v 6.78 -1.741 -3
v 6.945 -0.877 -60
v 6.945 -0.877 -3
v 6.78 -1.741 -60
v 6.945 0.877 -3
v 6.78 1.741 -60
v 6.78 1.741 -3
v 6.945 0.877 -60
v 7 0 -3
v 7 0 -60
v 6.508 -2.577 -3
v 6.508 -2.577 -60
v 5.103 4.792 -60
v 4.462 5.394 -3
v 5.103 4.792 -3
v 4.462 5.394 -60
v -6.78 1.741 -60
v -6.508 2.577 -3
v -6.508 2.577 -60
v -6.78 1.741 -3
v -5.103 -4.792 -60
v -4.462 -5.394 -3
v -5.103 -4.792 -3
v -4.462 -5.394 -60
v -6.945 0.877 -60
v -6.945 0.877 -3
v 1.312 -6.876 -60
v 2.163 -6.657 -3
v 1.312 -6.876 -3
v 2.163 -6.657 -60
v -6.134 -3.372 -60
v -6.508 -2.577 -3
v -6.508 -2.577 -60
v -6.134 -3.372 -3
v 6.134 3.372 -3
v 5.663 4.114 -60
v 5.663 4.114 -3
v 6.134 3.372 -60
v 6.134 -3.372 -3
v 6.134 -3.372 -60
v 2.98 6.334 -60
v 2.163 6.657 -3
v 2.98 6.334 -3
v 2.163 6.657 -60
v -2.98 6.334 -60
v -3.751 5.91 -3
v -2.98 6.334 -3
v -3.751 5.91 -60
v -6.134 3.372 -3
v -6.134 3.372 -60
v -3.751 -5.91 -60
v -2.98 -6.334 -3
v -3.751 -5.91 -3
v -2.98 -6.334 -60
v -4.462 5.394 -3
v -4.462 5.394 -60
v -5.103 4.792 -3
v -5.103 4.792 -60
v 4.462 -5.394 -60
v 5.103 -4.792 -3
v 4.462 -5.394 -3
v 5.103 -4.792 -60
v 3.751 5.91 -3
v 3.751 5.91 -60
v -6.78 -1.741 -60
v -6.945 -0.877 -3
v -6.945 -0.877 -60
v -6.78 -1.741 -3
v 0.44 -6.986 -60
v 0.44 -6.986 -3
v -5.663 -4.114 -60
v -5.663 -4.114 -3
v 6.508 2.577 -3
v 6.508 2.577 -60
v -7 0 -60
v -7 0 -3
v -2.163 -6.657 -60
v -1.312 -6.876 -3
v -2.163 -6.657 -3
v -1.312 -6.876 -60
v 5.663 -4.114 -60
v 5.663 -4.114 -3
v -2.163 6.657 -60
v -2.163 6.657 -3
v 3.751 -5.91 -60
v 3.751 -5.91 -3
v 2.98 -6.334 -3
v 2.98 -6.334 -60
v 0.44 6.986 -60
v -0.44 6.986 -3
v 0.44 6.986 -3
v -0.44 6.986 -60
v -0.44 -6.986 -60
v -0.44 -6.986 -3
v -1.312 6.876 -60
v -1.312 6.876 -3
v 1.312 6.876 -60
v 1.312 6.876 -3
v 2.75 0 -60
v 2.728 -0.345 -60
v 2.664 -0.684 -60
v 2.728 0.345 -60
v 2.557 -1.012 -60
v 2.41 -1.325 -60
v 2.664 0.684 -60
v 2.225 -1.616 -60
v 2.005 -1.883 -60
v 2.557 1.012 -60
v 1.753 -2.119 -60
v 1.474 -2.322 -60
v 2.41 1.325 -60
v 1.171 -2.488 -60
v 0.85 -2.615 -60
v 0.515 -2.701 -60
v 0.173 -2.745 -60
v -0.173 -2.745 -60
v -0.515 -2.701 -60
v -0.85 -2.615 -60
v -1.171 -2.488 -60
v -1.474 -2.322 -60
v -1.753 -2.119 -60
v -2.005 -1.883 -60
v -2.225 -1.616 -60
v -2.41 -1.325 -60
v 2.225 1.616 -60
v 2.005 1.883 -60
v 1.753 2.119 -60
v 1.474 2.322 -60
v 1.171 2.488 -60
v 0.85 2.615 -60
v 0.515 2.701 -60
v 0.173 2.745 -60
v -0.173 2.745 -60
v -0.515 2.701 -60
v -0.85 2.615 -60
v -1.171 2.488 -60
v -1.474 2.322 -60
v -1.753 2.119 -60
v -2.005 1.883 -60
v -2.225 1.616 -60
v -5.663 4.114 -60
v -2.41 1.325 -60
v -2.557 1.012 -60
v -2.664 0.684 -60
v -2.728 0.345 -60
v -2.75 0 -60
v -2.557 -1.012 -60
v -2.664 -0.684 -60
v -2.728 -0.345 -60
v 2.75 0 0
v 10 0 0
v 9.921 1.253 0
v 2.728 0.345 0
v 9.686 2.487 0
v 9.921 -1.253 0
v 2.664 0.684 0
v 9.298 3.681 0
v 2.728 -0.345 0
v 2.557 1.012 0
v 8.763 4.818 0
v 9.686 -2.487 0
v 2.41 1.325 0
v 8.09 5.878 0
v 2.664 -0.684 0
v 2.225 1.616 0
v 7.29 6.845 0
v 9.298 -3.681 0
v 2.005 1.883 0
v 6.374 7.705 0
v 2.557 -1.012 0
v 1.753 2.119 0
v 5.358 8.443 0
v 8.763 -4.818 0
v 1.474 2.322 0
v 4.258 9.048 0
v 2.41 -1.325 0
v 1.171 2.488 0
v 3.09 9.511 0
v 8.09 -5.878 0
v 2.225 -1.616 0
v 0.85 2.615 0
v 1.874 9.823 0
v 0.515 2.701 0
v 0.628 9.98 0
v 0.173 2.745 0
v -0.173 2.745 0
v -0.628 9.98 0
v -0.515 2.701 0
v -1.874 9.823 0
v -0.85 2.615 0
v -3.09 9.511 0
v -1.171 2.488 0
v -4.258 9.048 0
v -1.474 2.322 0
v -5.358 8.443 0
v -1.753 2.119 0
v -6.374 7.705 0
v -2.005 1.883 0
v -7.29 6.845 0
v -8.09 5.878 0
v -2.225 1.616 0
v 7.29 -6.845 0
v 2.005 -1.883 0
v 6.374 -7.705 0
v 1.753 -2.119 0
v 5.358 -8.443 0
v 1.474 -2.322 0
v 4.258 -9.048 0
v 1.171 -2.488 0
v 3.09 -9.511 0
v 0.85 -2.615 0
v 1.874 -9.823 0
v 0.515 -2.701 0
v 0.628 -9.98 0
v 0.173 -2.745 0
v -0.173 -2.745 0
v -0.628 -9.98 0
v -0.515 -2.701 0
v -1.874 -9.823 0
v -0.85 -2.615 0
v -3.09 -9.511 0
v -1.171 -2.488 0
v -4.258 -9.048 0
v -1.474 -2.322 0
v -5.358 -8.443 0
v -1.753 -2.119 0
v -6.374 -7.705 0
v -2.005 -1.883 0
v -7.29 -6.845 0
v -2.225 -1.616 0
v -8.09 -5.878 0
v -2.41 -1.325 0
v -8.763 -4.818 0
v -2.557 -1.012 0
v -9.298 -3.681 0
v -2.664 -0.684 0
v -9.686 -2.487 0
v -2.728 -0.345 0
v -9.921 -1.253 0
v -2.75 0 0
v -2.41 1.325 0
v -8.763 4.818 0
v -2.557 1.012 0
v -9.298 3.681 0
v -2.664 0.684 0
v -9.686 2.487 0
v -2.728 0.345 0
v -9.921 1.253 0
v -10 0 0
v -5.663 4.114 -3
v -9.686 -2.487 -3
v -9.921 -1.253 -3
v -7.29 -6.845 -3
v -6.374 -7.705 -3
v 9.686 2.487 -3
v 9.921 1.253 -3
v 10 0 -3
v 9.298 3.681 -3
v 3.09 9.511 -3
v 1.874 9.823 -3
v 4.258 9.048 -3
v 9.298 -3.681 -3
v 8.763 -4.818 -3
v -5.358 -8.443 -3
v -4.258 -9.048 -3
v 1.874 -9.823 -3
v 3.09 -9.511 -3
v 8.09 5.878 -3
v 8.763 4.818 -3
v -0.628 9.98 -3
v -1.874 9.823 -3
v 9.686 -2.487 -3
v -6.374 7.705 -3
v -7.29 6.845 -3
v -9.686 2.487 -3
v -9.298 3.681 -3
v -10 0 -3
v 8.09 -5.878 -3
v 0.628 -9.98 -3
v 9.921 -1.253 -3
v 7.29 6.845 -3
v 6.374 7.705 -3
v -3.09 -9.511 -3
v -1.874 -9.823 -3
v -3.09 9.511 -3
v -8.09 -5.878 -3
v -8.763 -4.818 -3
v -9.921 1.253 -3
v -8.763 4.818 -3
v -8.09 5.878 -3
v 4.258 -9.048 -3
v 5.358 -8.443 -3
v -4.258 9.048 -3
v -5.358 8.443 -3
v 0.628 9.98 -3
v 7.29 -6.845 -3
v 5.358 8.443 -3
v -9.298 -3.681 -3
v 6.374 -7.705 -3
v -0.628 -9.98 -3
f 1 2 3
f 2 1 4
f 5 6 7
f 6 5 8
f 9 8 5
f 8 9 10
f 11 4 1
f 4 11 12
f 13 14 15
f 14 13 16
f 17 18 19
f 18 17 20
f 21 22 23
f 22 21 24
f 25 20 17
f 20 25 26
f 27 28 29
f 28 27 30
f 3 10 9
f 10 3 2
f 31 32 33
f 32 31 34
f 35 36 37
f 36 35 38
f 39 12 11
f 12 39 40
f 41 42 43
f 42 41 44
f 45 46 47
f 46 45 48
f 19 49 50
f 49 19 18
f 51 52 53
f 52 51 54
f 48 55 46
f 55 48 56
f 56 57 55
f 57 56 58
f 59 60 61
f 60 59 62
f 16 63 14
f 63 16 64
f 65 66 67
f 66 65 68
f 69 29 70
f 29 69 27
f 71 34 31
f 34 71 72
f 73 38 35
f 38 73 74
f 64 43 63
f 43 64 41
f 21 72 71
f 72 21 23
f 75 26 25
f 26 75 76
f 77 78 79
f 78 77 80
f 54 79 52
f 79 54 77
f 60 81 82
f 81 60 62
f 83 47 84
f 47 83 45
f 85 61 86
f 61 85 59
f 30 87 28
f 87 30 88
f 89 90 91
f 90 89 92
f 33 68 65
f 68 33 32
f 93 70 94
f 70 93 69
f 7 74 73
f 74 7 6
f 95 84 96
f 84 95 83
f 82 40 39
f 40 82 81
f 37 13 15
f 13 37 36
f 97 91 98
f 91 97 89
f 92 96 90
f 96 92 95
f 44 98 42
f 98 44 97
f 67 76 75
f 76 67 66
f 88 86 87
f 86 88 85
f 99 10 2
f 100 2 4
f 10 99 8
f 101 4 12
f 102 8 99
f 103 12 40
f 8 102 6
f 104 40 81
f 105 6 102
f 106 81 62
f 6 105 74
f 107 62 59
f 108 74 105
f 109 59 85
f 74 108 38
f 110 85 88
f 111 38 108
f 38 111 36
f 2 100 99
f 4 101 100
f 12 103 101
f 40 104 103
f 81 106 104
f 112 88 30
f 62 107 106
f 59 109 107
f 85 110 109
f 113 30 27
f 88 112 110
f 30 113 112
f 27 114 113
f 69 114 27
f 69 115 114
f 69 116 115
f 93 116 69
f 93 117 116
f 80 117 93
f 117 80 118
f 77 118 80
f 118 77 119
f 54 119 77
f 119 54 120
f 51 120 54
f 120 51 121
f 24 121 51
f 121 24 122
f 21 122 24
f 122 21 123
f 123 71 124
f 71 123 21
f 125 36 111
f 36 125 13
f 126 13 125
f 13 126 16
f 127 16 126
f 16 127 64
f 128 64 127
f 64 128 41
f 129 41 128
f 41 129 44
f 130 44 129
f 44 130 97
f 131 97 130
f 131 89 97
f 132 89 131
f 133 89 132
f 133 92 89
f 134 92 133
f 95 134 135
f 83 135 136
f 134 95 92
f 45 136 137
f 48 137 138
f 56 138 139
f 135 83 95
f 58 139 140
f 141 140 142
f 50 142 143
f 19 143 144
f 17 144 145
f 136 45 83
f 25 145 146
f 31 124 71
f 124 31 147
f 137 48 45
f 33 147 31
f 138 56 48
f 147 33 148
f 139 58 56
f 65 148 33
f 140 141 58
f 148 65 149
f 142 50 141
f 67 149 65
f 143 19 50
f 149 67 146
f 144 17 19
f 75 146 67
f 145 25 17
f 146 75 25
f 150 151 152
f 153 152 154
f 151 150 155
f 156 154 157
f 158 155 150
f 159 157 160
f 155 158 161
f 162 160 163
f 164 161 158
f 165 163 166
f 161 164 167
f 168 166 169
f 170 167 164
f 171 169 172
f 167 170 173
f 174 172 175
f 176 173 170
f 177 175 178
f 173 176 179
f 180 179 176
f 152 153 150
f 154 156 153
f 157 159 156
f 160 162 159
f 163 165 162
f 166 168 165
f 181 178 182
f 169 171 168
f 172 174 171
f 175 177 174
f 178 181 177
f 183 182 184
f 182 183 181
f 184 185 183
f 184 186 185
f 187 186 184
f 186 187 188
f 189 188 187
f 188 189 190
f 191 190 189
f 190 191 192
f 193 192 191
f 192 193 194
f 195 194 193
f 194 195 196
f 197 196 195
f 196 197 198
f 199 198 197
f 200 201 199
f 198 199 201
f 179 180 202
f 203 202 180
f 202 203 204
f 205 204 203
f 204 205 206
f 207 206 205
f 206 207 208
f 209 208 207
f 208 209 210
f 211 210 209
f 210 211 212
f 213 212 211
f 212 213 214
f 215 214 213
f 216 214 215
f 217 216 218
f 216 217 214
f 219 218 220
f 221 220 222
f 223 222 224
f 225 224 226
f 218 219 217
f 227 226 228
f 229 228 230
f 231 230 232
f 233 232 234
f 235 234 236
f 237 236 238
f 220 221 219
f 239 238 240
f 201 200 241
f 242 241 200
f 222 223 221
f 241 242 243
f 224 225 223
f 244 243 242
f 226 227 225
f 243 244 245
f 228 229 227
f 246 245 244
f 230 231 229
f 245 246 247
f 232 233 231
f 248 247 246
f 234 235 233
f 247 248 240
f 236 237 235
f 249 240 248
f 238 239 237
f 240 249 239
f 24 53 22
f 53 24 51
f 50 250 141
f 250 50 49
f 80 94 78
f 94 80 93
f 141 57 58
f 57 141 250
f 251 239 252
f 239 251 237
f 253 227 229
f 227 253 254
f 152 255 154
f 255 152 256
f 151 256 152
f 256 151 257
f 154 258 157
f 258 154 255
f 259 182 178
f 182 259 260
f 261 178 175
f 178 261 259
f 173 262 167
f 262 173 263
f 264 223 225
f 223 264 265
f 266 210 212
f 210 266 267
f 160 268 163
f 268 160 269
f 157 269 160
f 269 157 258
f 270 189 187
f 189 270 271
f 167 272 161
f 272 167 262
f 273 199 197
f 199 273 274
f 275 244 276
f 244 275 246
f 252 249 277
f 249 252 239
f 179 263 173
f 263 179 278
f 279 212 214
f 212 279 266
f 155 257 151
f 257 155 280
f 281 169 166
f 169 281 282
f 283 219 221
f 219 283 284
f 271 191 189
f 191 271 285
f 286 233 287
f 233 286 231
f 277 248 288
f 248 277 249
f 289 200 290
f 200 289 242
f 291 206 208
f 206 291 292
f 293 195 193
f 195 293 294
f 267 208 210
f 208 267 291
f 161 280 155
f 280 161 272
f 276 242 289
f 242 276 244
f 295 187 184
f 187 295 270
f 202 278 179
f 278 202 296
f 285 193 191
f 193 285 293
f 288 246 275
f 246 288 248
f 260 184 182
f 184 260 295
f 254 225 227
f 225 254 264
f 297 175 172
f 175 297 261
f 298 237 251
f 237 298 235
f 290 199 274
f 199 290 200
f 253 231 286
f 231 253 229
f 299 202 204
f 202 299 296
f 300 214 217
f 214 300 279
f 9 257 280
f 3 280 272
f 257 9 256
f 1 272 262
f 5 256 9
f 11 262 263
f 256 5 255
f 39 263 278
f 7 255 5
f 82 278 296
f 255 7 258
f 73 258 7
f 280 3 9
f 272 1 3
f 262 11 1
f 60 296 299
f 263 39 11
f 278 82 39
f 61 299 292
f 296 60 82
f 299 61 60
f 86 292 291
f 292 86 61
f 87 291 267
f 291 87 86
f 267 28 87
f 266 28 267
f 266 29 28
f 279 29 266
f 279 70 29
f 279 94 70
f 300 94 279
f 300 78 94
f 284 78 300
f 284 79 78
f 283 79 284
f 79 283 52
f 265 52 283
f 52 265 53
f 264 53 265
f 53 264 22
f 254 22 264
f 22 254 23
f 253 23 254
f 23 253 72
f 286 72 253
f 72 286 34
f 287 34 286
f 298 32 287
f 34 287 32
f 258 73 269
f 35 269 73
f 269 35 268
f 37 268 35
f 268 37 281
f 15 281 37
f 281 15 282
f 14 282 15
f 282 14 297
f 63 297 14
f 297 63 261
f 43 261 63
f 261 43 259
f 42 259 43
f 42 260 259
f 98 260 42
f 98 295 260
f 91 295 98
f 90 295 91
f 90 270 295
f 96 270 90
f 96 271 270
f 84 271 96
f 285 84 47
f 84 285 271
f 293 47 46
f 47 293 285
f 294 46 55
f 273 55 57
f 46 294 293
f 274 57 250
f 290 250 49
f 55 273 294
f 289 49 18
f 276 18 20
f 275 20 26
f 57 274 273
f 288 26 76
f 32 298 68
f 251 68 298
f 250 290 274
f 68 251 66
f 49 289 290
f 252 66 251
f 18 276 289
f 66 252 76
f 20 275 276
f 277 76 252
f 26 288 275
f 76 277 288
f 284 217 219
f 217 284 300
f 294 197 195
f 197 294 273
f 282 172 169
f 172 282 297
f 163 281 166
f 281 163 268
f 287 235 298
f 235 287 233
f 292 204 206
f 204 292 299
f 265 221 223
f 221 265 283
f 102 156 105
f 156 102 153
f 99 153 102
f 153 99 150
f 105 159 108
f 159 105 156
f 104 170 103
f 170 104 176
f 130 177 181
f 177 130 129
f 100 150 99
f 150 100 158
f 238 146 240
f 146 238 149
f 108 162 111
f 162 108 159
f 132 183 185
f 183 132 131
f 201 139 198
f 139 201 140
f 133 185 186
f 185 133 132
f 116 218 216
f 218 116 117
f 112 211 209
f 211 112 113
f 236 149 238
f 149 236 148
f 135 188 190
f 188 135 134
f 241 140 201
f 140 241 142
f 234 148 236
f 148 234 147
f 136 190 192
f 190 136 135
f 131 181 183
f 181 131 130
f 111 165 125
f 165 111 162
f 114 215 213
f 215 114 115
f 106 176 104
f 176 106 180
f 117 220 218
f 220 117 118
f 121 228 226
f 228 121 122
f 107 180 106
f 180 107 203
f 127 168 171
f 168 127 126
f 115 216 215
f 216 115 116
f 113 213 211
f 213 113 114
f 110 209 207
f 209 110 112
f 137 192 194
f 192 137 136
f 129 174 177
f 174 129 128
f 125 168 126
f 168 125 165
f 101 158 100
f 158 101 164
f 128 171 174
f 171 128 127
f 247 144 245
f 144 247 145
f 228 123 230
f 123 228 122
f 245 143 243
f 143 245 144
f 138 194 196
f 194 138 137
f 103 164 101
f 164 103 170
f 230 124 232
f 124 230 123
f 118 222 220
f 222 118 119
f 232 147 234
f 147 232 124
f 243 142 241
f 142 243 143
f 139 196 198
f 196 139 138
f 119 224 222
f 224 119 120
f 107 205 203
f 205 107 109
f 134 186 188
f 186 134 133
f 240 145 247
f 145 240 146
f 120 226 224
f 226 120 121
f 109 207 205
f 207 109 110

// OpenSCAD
$fn = 50;


difference() {
	union() {
		translate(v = [0, 0, -60.0000000000]) {
			cylinder(h = 60, r = 7.0000000000);
		}
		translate(v = [0, 0, -3.0000000000]) {
			cylinder(h = 3, r = 10.0000000000);
		}
	}
	union() {
		#translate(v = [0, 0, -60]) {
			cylinder(h = 60, r = 2.7500000000);
		}
	}
}
